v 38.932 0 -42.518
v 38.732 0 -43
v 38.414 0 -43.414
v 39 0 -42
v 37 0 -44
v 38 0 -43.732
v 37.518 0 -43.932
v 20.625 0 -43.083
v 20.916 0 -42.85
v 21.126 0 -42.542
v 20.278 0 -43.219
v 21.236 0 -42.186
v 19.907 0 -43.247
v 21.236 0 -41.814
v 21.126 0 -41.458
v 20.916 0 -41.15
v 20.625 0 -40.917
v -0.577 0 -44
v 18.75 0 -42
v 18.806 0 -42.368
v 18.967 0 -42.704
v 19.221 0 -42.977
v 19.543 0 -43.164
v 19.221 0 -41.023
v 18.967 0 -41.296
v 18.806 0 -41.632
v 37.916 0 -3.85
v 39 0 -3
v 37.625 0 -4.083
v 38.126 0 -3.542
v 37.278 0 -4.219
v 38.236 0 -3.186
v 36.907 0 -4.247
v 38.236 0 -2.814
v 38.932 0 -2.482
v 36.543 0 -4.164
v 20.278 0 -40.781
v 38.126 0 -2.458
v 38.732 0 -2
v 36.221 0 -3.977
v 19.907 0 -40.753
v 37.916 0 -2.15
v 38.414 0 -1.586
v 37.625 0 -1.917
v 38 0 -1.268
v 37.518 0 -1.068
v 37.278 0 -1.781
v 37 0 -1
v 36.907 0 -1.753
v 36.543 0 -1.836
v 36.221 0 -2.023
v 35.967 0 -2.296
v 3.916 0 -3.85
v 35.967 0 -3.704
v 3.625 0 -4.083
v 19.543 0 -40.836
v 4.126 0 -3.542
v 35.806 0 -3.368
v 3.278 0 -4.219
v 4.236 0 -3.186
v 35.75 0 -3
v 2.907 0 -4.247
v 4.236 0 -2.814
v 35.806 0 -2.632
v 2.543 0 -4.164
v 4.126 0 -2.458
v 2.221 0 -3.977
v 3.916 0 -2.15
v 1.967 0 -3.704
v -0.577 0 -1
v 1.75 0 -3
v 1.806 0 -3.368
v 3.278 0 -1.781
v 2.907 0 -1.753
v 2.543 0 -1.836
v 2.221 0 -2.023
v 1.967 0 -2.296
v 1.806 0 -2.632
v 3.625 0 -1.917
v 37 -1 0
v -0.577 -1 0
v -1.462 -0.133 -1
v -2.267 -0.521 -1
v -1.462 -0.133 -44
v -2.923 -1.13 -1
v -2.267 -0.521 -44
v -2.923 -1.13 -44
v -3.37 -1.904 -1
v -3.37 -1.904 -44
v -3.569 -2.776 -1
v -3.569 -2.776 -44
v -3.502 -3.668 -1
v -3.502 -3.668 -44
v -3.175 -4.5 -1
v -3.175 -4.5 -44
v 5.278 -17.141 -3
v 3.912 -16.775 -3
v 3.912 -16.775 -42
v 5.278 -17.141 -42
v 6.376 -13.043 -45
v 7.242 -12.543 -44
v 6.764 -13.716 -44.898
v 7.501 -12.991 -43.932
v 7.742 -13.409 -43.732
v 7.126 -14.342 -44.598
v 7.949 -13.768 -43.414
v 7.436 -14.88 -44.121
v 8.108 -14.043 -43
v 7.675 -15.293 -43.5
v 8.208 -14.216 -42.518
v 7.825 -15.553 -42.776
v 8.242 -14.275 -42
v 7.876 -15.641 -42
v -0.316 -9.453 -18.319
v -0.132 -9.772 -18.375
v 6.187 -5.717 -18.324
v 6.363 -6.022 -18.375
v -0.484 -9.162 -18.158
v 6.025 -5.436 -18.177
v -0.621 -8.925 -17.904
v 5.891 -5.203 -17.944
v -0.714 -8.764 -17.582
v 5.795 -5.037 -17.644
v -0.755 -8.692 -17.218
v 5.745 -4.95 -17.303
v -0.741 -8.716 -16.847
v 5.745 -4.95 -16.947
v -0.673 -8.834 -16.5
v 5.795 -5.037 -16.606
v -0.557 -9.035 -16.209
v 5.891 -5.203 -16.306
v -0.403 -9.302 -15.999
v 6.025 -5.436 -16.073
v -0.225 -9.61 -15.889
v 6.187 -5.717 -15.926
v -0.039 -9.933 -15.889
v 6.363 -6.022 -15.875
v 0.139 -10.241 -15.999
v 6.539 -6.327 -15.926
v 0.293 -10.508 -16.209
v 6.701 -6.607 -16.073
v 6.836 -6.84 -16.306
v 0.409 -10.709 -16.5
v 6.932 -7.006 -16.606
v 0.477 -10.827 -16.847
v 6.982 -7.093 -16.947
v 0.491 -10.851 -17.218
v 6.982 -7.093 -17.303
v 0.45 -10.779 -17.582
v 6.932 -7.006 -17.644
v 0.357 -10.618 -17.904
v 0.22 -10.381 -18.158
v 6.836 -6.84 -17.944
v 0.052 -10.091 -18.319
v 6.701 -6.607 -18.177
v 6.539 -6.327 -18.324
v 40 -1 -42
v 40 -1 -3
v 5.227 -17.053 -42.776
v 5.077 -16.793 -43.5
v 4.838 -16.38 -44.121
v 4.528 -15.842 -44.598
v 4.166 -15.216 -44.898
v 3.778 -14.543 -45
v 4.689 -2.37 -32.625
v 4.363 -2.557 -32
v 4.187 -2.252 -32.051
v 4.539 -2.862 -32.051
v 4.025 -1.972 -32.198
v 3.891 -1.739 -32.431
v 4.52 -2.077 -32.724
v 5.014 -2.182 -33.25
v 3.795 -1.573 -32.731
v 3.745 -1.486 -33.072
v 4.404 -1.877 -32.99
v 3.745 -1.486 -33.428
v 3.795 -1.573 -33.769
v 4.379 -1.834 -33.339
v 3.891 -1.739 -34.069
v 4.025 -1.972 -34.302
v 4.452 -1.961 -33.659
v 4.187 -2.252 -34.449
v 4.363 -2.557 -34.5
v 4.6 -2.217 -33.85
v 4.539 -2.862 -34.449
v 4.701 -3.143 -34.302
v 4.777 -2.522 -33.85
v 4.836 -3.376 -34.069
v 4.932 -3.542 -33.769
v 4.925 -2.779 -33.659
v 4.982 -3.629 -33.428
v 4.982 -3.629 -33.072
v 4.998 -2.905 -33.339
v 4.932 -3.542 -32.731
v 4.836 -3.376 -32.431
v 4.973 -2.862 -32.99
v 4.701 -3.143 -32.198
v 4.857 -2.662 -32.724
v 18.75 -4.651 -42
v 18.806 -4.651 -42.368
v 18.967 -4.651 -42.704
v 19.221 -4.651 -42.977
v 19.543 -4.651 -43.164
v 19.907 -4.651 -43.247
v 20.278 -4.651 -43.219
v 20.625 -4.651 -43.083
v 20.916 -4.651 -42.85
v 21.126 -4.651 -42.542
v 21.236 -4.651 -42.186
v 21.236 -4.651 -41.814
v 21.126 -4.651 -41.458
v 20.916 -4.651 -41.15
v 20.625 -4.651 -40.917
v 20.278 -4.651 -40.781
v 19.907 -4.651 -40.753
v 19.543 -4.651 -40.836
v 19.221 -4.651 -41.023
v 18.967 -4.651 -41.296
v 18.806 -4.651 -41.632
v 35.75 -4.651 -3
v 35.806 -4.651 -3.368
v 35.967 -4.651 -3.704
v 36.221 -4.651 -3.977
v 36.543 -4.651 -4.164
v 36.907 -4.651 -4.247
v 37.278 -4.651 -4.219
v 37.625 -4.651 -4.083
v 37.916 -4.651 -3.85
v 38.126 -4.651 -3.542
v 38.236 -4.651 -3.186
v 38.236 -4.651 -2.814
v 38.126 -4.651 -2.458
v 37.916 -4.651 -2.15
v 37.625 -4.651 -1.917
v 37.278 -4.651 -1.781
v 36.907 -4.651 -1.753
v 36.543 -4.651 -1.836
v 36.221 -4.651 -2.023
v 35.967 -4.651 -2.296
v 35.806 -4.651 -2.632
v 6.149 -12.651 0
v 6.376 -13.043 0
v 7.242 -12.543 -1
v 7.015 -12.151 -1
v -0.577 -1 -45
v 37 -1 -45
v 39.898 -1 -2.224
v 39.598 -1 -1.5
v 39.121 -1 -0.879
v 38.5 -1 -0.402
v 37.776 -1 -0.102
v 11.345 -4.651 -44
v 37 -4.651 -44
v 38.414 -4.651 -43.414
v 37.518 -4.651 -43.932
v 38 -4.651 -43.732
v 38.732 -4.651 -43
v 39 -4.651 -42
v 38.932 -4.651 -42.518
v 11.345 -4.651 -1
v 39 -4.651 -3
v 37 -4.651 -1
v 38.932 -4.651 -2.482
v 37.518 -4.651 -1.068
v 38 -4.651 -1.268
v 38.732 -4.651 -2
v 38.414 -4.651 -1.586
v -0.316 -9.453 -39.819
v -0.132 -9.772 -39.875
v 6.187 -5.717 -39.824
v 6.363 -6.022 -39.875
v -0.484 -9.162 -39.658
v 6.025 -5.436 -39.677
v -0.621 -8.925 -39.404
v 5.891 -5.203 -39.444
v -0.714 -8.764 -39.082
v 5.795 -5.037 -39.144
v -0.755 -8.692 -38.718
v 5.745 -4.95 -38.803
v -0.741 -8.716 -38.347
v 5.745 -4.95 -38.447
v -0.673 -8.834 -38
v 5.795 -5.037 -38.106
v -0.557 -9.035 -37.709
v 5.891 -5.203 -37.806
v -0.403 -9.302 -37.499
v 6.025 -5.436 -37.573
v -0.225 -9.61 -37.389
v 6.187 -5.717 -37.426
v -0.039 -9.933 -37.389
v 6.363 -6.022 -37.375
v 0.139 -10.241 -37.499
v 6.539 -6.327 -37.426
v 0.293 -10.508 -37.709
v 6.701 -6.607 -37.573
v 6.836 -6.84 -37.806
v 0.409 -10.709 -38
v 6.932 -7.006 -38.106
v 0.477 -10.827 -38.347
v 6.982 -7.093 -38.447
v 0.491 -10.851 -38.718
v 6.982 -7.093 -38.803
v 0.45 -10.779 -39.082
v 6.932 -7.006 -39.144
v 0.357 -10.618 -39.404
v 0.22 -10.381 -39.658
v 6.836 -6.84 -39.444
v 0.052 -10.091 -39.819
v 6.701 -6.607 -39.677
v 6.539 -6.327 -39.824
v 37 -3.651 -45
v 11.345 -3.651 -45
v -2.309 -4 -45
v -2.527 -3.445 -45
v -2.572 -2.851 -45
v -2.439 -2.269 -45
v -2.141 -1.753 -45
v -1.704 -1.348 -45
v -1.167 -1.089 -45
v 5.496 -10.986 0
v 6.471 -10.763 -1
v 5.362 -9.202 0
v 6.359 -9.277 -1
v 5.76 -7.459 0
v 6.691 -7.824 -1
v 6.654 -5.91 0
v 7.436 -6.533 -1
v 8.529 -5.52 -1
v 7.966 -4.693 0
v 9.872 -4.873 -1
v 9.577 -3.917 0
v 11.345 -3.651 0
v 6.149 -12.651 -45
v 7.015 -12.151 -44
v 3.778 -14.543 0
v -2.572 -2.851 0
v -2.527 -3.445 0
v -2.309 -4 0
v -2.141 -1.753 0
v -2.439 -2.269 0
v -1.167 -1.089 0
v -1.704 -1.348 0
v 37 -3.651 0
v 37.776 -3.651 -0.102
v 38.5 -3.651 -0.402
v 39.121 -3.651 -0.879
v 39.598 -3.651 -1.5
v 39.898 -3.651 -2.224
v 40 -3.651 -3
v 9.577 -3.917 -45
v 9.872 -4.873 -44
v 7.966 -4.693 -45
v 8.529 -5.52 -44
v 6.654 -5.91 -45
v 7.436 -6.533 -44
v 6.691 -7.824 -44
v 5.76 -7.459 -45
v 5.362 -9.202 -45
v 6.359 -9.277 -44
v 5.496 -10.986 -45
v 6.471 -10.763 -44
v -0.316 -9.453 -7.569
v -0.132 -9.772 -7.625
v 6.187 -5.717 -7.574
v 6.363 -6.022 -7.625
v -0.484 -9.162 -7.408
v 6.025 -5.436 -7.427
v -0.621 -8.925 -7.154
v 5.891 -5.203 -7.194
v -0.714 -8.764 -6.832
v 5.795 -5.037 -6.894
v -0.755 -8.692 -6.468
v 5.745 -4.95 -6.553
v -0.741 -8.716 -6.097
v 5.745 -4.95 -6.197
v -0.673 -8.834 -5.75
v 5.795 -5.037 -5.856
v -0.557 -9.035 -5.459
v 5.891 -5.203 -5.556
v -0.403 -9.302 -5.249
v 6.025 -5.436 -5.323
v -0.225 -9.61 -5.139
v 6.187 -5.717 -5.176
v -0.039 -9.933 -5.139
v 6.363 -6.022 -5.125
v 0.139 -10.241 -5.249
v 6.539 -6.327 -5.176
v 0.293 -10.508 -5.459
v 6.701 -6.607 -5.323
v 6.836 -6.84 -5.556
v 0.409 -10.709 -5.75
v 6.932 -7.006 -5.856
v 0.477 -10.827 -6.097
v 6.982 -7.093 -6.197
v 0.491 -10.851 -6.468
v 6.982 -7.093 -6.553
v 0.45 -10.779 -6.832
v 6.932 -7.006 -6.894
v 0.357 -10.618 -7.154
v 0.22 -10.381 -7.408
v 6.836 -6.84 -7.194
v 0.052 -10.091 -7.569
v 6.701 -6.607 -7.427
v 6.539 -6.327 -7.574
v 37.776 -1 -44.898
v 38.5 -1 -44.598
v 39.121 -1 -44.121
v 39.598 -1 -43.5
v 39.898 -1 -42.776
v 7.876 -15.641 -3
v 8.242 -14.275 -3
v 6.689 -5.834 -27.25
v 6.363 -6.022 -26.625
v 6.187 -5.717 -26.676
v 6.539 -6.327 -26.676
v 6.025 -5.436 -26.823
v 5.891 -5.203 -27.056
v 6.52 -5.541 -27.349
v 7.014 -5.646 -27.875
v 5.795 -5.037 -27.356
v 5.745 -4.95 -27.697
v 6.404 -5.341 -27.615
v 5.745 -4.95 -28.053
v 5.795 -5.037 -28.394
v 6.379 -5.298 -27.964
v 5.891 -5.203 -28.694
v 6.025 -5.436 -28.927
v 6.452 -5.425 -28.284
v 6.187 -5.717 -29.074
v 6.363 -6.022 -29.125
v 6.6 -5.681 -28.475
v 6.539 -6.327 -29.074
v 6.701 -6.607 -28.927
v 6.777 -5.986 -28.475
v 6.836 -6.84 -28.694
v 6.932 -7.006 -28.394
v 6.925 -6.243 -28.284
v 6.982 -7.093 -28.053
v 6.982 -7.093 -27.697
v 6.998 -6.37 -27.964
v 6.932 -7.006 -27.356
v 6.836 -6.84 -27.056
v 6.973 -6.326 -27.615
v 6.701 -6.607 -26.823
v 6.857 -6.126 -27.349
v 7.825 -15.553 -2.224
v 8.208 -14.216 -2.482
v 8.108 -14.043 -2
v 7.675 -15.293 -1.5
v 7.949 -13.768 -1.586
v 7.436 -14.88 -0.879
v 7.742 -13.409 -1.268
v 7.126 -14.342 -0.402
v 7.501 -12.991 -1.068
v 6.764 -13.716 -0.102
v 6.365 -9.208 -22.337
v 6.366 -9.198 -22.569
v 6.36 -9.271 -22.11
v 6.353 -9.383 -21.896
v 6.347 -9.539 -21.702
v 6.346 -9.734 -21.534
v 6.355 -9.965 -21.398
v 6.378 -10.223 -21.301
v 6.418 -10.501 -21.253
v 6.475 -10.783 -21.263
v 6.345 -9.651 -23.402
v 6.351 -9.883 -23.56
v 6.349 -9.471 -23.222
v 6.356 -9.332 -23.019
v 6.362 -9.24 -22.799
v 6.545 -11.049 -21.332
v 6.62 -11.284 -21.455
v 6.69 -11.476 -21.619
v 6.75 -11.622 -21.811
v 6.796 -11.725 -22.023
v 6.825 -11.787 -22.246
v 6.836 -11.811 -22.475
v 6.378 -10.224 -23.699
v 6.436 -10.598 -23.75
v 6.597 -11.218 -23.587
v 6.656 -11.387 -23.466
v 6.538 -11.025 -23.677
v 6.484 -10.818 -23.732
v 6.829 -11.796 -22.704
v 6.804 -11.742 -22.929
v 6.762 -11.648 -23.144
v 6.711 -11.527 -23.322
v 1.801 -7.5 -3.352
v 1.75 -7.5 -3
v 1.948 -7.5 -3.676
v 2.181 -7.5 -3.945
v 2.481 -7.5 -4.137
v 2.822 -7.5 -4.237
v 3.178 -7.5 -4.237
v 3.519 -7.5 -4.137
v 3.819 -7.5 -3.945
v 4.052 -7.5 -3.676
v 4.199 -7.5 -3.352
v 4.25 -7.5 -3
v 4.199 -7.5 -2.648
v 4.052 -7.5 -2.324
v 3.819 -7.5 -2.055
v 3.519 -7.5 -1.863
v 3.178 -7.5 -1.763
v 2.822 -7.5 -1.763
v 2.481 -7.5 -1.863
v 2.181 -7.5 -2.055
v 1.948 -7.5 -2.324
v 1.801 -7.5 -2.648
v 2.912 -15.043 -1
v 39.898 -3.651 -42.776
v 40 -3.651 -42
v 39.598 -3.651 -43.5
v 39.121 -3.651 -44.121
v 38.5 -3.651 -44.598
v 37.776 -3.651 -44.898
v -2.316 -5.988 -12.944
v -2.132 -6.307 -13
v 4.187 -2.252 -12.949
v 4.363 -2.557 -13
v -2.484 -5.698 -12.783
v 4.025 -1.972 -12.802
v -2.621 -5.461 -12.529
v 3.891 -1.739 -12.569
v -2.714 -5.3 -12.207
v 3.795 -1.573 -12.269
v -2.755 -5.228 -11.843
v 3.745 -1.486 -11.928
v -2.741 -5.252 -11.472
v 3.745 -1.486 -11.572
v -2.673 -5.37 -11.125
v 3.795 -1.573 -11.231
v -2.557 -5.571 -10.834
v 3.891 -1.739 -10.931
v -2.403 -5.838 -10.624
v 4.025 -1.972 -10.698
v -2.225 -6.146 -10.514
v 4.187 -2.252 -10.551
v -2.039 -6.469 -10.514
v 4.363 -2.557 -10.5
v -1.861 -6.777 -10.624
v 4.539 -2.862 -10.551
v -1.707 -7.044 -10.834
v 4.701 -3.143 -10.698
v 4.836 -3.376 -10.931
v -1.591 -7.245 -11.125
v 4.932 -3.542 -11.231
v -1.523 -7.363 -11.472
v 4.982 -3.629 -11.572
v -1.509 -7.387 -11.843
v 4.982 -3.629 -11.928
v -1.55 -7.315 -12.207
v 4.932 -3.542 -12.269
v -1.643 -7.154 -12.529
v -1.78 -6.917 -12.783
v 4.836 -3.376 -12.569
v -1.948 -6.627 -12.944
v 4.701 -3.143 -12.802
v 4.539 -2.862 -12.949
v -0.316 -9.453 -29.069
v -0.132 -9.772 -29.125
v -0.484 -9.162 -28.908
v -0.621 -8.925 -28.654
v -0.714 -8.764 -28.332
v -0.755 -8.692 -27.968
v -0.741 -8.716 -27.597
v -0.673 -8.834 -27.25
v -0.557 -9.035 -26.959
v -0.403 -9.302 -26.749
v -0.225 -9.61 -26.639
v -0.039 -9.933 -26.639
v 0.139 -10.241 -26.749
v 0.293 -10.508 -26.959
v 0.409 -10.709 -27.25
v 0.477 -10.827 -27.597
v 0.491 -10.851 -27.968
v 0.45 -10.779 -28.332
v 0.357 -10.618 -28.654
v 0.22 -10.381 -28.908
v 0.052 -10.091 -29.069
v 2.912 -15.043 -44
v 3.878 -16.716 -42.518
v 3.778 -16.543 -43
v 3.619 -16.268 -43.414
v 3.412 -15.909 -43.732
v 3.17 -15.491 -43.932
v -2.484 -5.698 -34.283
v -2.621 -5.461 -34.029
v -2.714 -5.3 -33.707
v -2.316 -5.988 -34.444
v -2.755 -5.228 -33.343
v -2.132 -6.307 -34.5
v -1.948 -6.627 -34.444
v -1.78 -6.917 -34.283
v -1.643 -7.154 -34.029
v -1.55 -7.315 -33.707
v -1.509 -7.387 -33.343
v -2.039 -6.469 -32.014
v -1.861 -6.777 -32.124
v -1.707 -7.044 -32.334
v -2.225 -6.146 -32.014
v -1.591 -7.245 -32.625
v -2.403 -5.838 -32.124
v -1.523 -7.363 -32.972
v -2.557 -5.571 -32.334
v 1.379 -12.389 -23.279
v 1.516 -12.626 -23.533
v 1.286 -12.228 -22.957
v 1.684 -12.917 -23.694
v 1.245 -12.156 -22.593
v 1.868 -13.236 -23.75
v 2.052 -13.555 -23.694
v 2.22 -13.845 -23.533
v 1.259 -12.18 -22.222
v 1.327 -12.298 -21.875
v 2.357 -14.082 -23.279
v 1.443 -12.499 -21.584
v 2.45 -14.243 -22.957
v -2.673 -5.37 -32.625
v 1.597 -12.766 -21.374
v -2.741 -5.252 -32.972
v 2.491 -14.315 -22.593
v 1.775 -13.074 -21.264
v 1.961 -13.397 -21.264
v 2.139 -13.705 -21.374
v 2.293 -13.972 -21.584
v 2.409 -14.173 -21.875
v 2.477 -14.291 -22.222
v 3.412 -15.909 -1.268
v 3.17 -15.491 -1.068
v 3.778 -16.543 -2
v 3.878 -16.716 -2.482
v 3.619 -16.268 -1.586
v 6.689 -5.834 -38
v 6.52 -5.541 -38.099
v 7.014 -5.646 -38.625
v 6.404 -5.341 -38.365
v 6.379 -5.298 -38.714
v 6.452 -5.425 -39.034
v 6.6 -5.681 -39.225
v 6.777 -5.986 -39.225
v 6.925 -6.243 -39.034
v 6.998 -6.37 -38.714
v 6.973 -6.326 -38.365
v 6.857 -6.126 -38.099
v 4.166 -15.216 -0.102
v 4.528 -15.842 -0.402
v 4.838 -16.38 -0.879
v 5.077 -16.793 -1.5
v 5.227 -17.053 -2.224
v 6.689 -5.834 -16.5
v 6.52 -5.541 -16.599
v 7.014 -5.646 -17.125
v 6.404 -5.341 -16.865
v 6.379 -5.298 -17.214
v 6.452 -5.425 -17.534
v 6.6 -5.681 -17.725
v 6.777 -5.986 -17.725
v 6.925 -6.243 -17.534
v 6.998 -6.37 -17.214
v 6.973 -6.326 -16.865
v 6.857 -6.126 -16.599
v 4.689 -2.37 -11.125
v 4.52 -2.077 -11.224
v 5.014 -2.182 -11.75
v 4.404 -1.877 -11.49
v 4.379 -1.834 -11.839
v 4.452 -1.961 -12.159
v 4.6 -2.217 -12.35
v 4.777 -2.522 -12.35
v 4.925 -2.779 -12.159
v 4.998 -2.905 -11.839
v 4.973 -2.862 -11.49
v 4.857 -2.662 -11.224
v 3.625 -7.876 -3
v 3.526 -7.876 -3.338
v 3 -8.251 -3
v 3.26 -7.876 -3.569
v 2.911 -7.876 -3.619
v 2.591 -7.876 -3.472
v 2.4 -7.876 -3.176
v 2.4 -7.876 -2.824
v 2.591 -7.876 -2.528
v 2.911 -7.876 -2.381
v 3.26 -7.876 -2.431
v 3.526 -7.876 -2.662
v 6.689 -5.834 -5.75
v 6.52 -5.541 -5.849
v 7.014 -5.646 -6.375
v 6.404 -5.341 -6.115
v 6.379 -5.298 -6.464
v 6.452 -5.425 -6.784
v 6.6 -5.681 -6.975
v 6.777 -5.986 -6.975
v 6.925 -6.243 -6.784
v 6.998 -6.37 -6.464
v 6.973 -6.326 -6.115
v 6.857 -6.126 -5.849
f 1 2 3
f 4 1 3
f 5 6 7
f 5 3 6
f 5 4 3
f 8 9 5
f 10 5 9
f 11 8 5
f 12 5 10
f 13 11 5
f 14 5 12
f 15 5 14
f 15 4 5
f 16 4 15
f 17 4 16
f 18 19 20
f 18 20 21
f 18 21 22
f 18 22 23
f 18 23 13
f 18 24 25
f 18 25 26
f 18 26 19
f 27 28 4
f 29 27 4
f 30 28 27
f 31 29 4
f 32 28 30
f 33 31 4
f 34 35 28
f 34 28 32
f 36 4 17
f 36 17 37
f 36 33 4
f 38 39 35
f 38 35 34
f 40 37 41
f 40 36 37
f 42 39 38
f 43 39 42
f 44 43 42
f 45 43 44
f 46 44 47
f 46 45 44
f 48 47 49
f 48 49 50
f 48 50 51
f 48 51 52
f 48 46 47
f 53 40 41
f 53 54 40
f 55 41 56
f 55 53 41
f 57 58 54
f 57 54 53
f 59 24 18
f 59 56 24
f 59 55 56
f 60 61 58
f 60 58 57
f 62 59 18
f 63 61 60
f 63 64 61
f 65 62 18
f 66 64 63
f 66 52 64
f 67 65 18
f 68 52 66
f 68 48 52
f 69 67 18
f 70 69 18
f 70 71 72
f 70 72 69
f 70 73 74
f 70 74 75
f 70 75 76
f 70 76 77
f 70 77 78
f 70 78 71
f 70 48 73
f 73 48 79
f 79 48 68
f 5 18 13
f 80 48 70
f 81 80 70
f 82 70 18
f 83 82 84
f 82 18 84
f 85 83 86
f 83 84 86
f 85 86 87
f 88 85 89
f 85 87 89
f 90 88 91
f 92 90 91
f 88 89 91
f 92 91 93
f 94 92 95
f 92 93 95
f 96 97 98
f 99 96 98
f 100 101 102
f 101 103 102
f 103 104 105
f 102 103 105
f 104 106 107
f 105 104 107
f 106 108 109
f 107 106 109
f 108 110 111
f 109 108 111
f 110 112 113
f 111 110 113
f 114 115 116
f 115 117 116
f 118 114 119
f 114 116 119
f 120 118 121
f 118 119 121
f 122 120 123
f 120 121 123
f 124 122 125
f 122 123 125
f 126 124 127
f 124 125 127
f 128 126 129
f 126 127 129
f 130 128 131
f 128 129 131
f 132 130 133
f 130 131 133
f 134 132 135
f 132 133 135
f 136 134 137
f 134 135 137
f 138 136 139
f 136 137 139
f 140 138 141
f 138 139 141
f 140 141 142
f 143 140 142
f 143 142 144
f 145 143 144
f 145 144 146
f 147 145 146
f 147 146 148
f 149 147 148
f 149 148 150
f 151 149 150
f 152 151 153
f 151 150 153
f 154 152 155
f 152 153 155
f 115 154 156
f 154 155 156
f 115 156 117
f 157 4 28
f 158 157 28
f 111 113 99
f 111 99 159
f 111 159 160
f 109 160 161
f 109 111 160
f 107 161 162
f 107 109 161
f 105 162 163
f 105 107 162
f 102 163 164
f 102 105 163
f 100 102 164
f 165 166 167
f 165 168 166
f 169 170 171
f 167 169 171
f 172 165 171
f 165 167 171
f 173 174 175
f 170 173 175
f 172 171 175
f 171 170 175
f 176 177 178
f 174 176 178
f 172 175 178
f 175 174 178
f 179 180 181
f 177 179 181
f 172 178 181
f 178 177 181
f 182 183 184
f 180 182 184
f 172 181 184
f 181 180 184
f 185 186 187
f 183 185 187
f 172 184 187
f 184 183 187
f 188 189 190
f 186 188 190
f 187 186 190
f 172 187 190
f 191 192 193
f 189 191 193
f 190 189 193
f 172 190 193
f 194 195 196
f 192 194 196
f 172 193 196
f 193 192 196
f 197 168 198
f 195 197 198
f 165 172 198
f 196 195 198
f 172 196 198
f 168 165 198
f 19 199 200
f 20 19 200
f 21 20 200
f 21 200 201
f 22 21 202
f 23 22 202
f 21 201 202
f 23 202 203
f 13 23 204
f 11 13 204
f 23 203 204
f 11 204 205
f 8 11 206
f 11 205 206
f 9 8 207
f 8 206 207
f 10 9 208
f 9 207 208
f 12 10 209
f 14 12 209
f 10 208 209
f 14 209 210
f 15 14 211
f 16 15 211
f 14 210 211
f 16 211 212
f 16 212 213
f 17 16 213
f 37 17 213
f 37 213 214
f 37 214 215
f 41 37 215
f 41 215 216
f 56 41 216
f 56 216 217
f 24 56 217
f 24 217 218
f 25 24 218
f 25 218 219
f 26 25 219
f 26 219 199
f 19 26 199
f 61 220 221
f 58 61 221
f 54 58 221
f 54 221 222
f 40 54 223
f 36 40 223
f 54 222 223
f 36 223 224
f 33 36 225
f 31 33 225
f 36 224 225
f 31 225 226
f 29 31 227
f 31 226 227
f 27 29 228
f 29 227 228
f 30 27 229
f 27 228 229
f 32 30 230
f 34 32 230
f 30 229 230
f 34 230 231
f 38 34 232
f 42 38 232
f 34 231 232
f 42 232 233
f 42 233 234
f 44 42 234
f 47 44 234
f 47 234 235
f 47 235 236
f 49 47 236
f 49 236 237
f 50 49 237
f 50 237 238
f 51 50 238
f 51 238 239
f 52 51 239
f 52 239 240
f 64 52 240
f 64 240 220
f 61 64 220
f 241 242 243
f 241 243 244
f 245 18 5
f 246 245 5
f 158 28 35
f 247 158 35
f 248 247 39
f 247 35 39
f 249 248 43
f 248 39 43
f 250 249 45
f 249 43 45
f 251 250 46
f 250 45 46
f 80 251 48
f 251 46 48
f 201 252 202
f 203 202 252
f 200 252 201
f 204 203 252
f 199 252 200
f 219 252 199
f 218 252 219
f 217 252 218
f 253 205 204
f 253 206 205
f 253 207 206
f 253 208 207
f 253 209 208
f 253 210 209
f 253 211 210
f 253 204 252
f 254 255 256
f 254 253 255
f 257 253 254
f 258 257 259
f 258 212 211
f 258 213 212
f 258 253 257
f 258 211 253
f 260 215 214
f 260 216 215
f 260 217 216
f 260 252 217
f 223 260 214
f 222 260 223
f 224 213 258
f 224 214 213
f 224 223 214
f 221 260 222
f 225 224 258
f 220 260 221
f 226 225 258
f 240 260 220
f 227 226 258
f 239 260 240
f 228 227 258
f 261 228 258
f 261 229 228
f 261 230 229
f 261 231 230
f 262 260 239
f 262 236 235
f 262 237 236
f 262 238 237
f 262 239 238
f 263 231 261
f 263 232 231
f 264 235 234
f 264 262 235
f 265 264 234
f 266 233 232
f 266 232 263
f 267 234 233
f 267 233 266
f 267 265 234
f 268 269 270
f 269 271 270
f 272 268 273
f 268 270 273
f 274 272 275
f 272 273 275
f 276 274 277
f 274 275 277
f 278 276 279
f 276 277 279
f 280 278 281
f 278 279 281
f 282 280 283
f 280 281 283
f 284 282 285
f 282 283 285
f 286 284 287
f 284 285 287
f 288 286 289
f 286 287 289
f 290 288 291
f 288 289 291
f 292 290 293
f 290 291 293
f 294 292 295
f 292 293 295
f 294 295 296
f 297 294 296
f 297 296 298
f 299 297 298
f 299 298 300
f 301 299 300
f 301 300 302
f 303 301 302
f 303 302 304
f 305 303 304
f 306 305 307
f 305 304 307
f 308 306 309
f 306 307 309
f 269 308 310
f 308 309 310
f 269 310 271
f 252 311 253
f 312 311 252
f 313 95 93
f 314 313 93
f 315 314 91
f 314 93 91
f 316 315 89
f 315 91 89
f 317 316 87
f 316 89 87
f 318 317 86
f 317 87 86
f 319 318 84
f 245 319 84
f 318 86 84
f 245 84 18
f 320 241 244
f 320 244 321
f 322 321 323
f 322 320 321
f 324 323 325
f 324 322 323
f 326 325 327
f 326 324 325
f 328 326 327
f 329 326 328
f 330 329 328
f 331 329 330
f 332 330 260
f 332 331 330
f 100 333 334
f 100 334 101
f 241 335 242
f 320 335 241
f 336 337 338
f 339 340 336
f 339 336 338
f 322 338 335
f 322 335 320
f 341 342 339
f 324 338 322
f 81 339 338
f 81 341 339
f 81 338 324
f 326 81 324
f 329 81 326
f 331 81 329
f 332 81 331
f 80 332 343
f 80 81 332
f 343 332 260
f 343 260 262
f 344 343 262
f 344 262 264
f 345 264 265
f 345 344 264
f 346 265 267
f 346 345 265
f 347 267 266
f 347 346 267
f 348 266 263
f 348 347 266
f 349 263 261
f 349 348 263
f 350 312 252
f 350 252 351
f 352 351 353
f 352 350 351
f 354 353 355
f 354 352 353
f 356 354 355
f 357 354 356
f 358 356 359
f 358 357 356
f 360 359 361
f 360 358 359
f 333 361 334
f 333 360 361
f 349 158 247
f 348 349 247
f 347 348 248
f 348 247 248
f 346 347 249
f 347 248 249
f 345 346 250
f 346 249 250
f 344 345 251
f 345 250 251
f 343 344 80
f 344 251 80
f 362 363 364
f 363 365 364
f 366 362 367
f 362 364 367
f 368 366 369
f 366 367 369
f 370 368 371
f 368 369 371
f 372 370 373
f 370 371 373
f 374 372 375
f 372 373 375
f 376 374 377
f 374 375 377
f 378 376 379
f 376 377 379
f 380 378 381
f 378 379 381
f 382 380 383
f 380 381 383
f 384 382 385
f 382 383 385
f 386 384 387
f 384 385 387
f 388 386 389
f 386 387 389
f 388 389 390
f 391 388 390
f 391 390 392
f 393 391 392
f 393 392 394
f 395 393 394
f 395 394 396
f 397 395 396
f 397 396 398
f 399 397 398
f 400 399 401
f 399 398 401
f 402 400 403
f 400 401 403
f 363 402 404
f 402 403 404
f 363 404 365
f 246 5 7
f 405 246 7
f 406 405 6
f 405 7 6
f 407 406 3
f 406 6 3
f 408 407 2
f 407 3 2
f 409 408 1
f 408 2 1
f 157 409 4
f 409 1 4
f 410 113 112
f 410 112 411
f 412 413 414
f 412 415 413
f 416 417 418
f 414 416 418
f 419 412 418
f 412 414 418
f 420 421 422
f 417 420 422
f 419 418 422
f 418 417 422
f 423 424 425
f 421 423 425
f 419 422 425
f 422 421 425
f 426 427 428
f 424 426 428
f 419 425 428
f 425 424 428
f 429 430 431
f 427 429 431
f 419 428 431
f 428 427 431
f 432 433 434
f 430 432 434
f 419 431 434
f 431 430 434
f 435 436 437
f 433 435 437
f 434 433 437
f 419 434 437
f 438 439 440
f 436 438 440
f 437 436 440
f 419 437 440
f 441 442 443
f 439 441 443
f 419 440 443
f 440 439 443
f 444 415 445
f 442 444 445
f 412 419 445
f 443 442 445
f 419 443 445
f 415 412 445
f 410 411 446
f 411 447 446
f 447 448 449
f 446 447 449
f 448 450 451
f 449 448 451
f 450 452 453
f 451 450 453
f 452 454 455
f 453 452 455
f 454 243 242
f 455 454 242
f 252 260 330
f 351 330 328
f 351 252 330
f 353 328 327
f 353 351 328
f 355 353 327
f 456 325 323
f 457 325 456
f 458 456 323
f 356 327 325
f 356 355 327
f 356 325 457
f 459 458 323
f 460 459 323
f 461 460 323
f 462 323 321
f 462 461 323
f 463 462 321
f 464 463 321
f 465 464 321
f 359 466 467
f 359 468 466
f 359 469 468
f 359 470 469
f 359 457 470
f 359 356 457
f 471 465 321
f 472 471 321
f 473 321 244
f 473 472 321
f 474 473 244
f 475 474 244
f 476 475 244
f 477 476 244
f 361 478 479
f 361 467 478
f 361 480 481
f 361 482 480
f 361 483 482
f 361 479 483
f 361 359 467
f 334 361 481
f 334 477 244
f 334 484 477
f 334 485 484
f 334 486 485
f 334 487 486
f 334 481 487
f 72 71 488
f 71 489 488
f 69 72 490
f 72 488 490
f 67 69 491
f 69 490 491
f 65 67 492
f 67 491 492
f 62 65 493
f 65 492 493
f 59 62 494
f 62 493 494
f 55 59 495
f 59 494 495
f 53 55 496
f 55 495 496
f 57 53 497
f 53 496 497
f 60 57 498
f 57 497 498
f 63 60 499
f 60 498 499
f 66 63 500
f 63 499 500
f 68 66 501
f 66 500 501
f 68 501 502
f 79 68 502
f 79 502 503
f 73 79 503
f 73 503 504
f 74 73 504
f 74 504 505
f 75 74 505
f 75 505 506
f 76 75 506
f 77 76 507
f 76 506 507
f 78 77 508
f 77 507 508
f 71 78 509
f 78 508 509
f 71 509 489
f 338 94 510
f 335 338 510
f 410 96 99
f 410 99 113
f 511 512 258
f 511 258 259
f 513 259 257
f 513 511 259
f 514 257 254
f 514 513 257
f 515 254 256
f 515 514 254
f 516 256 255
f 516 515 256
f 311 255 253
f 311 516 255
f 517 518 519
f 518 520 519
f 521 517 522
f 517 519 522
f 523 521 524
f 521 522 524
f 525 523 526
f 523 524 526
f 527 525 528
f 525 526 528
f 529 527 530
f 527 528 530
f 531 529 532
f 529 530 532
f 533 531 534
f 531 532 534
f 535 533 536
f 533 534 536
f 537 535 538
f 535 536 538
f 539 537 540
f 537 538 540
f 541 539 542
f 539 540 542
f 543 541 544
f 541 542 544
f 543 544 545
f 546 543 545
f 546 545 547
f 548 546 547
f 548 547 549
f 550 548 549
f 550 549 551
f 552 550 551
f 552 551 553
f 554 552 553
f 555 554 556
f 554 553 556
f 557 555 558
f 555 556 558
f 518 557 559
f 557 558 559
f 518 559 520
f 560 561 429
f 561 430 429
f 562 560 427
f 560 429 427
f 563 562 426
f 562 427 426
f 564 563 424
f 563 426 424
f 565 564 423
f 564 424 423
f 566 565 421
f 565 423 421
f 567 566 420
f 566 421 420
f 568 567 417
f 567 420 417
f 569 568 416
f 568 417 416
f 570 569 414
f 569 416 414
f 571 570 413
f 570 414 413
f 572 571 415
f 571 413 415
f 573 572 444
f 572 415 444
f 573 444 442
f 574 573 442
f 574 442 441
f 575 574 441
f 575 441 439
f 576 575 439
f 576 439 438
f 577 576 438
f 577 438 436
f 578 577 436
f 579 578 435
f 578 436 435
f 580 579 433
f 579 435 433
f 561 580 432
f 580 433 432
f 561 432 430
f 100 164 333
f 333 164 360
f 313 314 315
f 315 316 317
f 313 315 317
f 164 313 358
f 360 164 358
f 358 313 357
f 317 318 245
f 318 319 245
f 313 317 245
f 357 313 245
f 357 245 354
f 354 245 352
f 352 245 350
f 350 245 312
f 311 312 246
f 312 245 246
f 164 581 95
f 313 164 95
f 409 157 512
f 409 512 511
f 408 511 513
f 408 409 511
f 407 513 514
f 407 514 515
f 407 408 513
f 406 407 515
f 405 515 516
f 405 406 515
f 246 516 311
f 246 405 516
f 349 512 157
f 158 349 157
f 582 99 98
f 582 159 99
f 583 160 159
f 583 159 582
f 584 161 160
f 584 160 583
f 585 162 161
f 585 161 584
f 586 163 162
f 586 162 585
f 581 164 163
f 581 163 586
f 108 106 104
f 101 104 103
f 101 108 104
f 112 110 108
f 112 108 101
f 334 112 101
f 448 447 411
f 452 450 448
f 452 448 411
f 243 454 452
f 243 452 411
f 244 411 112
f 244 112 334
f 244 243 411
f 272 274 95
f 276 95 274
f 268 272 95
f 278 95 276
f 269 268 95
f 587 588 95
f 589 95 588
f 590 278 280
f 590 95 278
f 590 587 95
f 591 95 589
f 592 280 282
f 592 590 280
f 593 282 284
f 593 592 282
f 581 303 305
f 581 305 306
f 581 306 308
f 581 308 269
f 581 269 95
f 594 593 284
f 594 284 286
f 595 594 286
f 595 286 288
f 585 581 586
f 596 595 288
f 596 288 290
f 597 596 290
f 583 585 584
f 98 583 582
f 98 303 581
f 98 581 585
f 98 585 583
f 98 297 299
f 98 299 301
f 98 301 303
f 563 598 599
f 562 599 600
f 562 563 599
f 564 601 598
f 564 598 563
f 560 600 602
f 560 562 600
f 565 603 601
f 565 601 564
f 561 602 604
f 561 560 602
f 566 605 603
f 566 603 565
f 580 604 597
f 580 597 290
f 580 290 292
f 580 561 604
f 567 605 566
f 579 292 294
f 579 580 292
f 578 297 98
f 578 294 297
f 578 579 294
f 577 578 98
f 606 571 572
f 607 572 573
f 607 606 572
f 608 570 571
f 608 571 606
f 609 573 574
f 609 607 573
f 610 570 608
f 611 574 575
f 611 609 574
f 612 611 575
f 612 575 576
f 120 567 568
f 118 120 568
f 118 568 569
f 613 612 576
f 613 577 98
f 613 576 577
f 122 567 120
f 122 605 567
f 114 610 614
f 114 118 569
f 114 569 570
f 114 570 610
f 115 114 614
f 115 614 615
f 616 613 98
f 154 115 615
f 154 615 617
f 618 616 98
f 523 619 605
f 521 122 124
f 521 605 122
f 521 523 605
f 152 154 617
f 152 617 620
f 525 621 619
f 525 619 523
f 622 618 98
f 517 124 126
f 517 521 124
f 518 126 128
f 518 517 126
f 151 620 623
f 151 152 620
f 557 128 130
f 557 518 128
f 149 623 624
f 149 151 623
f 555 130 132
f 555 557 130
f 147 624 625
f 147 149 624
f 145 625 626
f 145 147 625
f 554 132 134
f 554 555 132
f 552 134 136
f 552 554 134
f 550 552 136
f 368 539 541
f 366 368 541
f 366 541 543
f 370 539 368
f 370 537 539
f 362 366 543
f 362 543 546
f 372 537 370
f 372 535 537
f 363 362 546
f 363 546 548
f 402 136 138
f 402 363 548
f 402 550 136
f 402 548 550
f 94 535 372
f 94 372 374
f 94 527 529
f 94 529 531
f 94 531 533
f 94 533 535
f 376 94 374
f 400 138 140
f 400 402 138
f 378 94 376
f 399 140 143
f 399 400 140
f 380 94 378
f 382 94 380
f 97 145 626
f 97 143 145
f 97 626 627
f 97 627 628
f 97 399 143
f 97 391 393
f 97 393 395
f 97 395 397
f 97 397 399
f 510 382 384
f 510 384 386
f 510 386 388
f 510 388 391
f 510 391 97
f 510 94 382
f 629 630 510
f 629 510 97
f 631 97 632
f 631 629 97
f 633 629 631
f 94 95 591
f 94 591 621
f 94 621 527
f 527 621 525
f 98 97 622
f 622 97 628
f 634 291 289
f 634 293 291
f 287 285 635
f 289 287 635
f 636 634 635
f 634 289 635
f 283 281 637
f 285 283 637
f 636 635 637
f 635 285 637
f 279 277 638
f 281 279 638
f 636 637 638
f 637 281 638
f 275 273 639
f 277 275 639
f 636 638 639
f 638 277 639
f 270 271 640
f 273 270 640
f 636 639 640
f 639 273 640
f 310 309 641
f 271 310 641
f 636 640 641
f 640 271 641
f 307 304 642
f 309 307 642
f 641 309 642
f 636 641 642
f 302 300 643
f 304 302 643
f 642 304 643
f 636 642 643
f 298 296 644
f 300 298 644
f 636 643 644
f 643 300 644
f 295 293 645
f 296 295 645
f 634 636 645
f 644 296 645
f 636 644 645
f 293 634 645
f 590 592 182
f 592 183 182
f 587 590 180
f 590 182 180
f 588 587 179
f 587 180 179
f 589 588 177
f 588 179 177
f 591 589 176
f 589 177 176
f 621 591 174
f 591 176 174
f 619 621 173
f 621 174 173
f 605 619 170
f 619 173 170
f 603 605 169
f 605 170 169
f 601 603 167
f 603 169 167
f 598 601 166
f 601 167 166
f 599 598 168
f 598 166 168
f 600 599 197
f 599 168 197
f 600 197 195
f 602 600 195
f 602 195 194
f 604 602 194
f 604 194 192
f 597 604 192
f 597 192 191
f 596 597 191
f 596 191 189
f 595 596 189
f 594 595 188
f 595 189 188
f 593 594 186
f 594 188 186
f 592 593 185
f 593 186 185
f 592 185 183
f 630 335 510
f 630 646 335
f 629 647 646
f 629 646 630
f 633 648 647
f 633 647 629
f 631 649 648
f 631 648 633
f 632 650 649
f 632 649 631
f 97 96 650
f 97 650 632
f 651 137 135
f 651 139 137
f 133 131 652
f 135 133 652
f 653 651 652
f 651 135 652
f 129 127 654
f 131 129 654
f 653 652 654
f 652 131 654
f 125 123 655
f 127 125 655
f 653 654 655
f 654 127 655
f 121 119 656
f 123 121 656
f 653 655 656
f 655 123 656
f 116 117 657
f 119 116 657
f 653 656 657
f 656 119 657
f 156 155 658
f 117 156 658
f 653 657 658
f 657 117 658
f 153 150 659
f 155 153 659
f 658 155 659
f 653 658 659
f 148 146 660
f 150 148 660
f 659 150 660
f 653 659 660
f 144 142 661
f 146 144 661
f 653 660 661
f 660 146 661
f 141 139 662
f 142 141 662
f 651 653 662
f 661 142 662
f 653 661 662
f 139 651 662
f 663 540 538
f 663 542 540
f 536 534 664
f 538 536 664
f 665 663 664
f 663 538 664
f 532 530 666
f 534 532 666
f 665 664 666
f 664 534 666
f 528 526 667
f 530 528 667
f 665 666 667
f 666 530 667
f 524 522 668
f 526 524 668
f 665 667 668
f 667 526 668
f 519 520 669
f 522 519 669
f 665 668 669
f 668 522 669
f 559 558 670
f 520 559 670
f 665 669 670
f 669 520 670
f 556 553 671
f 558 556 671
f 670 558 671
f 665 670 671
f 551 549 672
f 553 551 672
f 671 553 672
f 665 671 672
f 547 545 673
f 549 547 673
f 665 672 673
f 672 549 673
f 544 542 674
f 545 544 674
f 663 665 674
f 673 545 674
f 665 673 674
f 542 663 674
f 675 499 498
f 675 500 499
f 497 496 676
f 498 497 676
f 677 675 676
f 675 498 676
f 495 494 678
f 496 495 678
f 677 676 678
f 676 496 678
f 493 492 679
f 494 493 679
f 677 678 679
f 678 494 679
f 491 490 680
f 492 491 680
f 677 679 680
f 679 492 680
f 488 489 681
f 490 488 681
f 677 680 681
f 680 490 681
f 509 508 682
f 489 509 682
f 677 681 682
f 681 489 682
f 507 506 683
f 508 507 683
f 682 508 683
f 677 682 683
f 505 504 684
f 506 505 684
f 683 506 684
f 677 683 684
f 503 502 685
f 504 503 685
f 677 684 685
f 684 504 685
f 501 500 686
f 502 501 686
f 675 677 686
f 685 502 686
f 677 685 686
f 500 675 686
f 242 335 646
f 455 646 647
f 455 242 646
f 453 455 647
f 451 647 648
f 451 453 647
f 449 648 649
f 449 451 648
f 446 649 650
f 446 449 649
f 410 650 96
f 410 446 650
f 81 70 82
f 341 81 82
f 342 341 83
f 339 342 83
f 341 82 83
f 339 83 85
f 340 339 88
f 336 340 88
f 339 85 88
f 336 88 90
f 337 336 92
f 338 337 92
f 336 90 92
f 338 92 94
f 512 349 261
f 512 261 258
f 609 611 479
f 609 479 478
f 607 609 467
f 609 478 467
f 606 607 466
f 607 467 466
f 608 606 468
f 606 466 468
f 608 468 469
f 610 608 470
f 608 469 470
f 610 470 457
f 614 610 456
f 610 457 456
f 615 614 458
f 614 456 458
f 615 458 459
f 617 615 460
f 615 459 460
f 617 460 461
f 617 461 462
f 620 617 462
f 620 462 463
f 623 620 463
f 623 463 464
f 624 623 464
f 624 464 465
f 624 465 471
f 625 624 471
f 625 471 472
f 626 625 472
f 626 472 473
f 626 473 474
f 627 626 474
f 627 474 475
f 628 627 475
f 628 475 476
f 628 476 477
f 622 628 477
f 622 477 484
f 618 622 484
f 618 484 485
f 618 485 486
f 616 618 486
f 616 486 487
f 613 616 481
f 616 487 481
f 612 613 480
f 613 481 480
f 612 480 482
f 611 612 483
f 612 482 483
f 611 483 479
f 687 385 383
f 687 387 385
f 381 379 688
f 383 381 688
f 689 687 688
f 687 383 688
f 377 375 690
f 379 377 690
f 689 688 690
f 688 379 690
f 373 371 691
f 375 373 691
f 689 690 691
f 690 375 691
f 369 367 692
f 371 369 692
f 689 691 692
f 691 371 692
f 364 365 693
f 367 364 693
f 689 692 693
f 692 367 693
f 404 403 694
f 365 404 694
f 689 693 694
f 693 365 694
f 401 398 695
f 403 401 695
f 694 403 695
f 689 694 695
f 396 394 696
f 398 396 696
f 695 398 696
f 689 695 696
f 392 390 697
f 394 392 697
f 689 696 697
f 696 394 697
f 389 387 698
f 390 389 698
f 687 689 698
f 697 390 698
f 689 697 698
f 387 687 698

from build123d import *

# Parameters (mm, degrees)
EXTRUDE_1_DEPTH        = 45
FILLET_1_R             = 3
FILLET_2_R             = 5
FILLET_3_R             = 3
FILLET_4_R             = 3
CHAMFER_1_SIZE         = 1
HOLE_WIZARD_M3_1_D     = 2.5
HOLE_WIZARD_M3_1_DEPTH = 7.5
HOLE_WIZARD_M3_1_TIP   = 0.751075774
CHAMFER_2_SIZE         = 1
HOLE_WIZARD_M3_2_D     = 2.5
HOLE_WIZARD_M3_2_DEPTH = 7.5
HOLE_WIZARD_M3_2_TIP   = 0.751075774


with BuildPart() as part:
    # 草图1 → 凸台-拉伸1 (new body)
    with BuildSketch(Plane.XY):
        Polygon((40, 0), (-5.773502692, 0), (4.411675645, -17.641246358), (8.741802661, -15.141246359), (2.685178332, -4.650865298), (40, -4.650865298), align=None)
    extrude(amount=-EXTRUDE_1_DEPTH)

    # 圆角1
    fillet_1_edges = [part.edges().sort_by_distance(p)[0] for p in [
        (40, -2.325432649, -45),
        (40, -2.325432649, 0),
    ]]
    fillet(fillet_1_edges, radius=FILLET_1_R)

    # 圆角2
    fillet_2_edges = [part.edges().sort_by_distance(p)[0] for p in [
        (2.685178332, -4.650865298, -22.5),
    ]]
    fillet(fillet_2_edges, radius=FILLET_2_R)

    # 圆角3
    fillet_3_edges = [part.edges().sort_by_distance(p)[0] for p in [
        (-5.773502692, 0, -22.5),
    ]]
    fillet(fillet_3_edges, radius=FILLET_3_R)

    # 圆角4
    fillet_4_edges = [part.edges().sort_by_distance(p)[0] for p in [
        (6.576739153, -16.391246359, -45),
        (6.576739153, -16.391246359, 0),
    ]]
    fillet(fillet_4_edges, radius=FILLET_4_R)

    # 倒角1
    chamfer_1_edges = [part.edges().sort_by_distance(p)[0] for p in [
        (40, -4.650865298, -22.5),
        (24.172716185, -4.650865298, -45),
        (39.121320344, -4.650865298, -44.121320344),
        (39.121320344, -4.650865298, -0.878679656),
        (7.128554006, -12.347017723, -45),
        (24.172716185, -4.650865298, 0),
        (7.01530535, -7.150865298, 0),
        (7.01530535, -7.150865298, -45),
        (8.741802661, -15.141246359, -22.5),
        (7.128554006, -12.347017723, 0),
        (8.302462833, -14.380287455, -0.878679656),
        (8.302462833, -14.380287455, -44.121320344),
    ]]
    chamfer(chamfer_1_edges, length=CHAMFER_1_SIZE)

    # M3 螺纹孔1
    with Locations(Plane(origin=(0, 0, 0), x_dir=(1, 0, 0), z_dir=(0, 1, 0))):
        with Locations((20, 42), (3, 3), (37, 3)):
            Hole(HOLE_WIZARD_M3_1_D / 2, depth=HOLE_WIZARD_M3_1_DEPTH)
            with Locations((0, 0, -(HOLE_WIZARD_M3_1_DEPTH + HOLE_WIZARD_M3_1_TIP / 2))):  # 118° drill point
                Cone(0, HOLE_WIZARD_M3_1_D / 2, HOLE_WIZARD_M3_1_TIP, mode=Mode.SUBTRACT)

    # 倒角2
    chamfer_2_edges = [part.edges().sort_by_distance(p)[0] for p in [
        (18.211324866, 0, 0),
        (40, 0, -22.5),
        (39.121320344, 0, -44.121320344),
        (39.121320344, 0, -0.878679656),
        (18.211324866, 0, -45),
        (-0.131875417, -9.771585074, 0),
        (-3.17542648, -1.5, 0),
        (-3.17542648, -1.5, -45),
        (-0.131875417, -9.771585074, -45),
        (4.411675645, -17.641246358, -22.5),
        (3.972335817, -16.880287454, -0.878679656),
        (3.972335817, -16.880287454, -44.121320344),
    ]]
    chamfer(chamfer_2_edges, length=CHAMFER_2_SIZE)

    # M3 螺纹孔2
    with Locations(Plane(origin=(-4.330127018, -2.5, 0), x_dir=(0, 0, 1), z_dir=(-0.866025404, -0.5, 0))):
        with Locations((-38.625, -8.3965032), (-33.25, -4.3965032), (-27.875, -8.3965032), (-22.5, -12.3965032), (-17.125, -8.3965032), (-11.75, -4.3965032), (-6.375, -8.3965032)):
            Hole(HOLE_WIZARD_M3_2_D / 2, depth=HOLE_WIZARD_M3_2_DEPTH)
            with Locations((0, 0, -(HOLE_WIZARD_M3_2_DEPTH + HOLE_WIZARD_M3_2_TIP / 2))):  # 118° drill point
                Cone(0, HOLE_WIZARD_M3_2_D / 2, HOLE_WIZARD_M3_2_TIP, mode=Mode.SUBTRACT)


solid = part.part
